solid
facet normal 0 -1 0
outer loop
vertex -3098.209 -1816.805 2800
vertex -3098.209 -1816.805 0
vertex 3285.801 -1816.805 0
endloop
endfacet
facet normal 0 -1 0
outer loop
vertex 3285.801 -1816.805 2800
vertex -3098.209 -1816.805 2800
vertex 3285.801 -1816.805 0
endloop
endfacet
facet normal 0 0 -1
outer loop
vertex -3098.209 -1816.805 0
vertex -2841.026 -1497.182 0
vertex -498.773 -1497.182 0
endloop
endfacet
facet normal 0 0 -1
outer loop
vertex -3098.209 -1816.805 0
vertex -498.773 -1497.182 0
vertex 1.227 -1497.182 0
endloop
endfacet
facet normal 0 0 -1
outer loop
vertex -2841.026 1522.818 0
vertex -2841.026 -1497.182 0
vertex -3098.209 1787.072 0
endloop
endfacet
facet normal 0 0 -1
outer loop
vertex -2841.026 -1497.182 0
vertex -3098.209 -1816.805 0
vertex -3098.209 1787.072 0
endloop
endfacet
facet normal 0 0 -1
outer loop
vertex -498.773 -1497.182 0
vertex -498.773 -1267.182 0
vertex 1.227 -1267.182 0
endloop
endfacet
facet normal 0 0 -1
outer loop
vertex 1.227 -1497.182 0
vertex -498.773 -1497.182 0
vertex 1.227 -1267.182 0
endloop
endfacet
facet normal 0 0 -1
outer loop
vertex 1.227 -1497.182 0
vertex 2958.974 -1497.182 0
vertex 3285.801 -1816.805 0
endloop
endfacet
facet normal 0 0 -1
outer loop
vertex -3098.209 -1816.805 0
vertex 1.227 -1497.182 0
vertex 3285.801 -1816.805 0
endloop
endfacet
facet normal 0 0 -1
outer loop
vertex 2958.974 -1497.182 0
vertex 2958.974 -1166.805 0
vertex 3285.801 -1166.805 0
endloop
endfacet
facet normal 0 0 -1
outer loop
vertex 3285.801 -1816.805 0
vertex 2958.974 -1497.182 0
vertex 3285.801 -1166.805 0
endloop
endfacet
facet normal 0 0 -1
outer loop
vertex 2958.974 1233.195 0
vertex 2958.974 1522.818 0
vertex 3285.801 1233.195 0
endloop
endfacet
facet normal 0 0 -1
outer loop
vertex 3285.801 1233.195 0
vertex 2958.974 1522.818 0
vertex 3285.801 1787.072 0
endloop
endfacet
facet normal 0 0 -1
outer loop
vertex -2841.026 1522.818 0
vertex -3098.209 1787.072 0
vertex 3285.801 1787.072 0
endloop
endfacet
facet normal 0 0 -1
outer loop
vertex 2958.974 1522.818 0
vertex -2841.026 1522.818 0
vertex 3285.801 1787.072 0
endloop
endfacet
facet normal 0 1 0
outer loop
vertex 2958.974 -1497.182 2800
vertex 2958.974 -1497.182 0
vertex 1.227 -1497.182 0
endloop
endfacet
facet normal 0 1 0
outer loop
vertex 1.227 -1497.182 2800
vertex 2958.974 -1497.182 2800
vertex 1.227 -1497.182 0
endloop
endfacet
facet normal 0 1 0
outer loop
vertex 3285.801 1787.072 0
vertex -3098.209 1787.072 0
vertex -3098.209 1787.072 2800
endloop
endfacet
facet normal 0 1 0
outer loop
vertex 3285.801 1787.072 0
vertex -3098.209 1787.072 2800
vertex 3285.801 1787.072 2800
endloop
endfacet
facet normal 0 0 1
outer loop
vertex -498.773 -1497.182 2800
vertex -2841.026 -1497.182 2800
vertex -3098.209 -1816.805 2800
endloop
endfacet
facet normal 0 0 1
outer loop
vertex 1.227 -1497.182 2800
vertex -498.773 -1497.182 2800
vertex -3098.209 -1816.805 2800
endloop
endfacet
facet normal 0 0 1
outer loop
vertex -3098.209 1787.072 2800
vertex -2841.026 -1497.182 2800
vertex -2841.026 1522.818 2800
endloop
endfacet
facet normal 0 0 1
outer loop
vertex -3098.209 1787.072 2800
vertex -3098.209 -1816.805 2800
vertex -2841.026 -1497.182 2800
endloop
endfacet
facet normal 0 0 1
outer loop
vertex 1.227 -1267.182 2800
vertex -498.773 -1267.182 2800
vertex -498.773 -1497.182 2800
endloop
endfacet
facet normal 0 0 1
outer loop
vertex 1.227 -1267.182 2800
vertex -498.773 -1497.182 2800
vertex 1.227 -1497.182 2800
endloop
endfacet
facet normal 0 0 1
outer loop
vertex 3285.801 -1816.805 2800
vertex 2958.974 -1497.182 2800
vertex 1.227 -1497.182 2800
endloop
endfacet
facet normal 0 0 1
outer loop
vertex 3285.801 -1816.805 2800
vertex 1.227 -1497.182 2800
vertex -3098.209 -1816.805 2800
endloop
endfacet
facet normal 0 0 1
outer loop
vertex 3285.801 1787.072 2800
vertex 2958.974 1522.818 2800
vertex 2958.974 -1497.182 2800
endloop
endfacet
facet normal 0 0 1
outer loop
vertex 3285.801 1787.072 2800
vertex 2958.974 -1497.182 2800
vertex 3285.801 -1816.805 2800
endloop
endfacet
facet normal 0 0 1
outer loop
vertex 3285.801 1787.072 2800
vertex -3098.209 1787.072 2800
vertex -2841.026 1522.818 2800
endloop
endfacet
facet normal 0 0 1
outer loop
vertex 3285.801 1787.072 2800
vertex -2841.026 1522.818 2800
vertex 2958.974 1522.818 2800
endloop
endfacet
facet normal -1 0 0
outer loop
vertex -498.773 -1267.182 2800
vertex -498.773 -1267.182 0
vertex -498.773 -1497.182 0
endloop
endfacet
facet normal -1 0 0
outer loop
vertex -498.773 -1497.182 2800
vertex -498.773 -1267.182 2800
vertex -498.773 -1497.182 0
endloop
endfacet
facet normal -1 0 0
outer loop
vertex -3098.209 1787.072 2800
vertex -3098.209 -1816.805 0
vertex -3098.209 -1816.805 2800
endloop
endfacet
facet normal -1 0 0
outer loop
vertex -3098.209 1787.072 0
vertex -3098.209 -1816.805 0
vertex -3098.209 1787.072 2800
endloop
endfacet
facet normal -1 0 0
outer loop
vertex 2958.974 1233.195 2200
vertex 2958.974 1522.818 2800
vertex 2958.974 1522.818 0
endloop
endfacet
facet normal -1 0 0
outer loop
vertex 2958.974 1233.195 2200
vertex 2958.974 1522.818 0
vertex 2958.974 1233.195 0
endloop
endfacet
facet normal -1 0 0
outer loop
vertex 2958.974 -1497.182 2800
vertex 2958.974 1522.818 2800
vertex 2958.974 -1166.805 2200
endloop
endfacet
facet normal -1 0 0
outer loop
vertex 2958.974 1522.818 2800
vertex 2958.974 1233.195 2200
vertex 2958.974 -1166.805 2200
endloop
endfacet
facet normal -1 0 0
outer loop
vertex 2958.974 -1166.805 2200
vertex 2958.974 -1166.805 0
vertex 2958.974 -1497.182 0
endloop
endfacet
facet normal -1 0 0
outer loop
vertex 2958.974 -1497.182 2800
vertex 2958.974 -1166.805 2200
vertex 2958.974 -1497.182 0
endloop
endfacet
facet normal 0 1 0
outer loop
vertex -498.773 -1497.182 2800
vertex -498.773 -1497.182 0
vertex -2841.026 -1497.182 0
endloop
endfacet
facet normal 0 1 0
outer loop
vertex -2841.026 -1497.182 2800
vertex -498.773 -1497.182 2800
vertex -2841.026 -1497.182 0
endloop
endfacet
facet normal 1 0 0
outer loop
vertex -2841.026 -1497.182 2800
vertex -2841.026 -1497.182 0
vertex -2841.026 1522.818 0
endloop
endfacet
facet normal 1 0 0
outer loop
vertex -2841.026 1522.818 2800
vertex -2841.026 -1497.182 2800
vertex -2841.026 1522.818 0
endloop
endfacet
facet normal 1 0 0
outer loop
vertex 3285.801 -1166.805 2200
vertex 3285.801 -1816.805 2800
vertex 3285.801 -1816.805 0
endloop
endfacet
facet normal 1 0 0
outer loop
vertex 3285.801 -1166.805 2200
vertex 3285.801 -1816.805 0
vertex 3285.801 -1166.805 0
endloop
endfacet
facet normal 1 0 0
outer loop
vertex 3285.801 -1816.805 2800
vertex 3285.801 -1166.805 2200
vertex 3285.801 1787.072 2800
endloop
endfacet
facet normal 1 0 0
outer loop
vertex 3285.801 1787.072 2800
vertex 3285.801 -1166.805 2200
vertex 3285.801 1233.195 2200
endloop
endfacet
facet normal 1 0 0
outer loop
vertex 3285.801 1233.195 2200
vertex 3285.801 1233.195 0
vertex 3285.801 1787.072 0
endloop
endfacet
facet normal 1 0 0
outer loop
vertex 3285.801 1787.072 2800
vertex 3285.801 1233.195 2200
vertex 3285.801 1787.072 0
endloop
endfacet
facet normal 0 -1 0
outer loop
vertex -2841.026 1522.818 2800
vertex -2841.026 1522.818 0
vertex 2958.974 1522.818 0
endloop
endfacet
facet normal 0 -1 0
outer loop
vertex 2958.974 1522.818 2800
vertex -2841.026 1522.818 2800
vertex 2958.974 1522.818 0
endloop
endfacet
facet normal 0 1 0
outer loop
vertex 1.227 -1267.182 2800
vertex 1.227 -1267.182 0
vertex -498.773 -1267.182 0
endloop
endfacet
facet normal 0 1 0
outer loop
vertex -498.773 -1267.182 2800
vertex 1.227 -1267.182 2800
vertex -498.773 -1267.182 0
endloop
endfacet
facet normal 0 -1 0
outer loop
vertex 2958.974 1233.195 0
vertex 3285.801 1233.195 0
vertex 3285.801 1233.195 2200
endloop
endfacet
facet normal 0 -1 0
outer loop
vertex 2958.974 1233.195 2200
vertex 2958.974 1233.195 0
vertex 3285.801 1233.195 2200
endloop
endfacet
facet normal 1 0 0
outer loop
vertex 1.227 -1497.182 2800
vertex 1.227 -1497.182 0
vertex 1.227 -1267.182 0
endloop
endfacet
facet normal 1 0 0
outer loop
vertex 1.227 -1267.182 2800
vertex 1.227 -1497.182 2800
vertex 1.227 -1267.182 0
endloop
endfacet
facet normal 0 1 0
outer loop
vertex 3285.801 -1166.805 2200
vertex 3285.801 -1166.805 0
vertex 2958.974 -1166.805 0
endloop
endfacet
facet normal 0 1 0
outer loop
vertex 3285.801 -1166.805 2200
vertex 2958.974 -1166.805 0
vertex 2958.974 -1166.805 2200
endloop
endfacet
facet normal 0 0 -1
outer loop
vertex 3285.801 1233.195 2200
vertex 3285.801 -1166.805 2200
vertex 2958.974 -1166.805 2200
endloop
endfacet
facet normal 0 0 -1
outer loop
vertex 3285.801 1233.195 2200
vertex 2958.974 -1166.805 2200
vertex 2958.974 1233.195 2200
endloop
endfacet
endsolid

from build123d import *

# Parameters (mm, degrees)
F0_W     = 6384.0107917786
F0_H     = 3603.8770675659
F1_DEPTH = 2800
F2_W     = 2400
F2_H     = 2200
F3_DEPTH = 326.8275394628


with BuildPart() as f1:
    # F0 (on Top) → F1 (new body)
    with BuildSketch(Plane.XY):
        with Locations((93.7960147858, -14.866232872)):
            Rectangle(F0_W, F0_H)
        Polygon((-498.7729787827, -1497.181711942), (-2841.0261287877, -1497.181711942), (-2841.0261287877, 1522.818288058), (2958.9738712123, 1522.818288058), (2958.9738712123, -1497.181711942), (1.2270212173, -1497.181711942), (1.2270212173, -1267.181711942), (-498.7729787827, -1267.181711942), align=None, mode=Mode.SUBTRACT)
    extrude(amount=F1_DEPTH)

    # F2 (on face) → F3 (cut, through all)
    with BuildSketch(Plane.YZ.offset(3285.801410675)):
        with Locations((33.195233345, 1100)):
            Rectangle(F2_W, F2_H)
    extrude(amount=-F3_DEPTH, mode=Mode.SUBTRACT)


solid = f1.part
